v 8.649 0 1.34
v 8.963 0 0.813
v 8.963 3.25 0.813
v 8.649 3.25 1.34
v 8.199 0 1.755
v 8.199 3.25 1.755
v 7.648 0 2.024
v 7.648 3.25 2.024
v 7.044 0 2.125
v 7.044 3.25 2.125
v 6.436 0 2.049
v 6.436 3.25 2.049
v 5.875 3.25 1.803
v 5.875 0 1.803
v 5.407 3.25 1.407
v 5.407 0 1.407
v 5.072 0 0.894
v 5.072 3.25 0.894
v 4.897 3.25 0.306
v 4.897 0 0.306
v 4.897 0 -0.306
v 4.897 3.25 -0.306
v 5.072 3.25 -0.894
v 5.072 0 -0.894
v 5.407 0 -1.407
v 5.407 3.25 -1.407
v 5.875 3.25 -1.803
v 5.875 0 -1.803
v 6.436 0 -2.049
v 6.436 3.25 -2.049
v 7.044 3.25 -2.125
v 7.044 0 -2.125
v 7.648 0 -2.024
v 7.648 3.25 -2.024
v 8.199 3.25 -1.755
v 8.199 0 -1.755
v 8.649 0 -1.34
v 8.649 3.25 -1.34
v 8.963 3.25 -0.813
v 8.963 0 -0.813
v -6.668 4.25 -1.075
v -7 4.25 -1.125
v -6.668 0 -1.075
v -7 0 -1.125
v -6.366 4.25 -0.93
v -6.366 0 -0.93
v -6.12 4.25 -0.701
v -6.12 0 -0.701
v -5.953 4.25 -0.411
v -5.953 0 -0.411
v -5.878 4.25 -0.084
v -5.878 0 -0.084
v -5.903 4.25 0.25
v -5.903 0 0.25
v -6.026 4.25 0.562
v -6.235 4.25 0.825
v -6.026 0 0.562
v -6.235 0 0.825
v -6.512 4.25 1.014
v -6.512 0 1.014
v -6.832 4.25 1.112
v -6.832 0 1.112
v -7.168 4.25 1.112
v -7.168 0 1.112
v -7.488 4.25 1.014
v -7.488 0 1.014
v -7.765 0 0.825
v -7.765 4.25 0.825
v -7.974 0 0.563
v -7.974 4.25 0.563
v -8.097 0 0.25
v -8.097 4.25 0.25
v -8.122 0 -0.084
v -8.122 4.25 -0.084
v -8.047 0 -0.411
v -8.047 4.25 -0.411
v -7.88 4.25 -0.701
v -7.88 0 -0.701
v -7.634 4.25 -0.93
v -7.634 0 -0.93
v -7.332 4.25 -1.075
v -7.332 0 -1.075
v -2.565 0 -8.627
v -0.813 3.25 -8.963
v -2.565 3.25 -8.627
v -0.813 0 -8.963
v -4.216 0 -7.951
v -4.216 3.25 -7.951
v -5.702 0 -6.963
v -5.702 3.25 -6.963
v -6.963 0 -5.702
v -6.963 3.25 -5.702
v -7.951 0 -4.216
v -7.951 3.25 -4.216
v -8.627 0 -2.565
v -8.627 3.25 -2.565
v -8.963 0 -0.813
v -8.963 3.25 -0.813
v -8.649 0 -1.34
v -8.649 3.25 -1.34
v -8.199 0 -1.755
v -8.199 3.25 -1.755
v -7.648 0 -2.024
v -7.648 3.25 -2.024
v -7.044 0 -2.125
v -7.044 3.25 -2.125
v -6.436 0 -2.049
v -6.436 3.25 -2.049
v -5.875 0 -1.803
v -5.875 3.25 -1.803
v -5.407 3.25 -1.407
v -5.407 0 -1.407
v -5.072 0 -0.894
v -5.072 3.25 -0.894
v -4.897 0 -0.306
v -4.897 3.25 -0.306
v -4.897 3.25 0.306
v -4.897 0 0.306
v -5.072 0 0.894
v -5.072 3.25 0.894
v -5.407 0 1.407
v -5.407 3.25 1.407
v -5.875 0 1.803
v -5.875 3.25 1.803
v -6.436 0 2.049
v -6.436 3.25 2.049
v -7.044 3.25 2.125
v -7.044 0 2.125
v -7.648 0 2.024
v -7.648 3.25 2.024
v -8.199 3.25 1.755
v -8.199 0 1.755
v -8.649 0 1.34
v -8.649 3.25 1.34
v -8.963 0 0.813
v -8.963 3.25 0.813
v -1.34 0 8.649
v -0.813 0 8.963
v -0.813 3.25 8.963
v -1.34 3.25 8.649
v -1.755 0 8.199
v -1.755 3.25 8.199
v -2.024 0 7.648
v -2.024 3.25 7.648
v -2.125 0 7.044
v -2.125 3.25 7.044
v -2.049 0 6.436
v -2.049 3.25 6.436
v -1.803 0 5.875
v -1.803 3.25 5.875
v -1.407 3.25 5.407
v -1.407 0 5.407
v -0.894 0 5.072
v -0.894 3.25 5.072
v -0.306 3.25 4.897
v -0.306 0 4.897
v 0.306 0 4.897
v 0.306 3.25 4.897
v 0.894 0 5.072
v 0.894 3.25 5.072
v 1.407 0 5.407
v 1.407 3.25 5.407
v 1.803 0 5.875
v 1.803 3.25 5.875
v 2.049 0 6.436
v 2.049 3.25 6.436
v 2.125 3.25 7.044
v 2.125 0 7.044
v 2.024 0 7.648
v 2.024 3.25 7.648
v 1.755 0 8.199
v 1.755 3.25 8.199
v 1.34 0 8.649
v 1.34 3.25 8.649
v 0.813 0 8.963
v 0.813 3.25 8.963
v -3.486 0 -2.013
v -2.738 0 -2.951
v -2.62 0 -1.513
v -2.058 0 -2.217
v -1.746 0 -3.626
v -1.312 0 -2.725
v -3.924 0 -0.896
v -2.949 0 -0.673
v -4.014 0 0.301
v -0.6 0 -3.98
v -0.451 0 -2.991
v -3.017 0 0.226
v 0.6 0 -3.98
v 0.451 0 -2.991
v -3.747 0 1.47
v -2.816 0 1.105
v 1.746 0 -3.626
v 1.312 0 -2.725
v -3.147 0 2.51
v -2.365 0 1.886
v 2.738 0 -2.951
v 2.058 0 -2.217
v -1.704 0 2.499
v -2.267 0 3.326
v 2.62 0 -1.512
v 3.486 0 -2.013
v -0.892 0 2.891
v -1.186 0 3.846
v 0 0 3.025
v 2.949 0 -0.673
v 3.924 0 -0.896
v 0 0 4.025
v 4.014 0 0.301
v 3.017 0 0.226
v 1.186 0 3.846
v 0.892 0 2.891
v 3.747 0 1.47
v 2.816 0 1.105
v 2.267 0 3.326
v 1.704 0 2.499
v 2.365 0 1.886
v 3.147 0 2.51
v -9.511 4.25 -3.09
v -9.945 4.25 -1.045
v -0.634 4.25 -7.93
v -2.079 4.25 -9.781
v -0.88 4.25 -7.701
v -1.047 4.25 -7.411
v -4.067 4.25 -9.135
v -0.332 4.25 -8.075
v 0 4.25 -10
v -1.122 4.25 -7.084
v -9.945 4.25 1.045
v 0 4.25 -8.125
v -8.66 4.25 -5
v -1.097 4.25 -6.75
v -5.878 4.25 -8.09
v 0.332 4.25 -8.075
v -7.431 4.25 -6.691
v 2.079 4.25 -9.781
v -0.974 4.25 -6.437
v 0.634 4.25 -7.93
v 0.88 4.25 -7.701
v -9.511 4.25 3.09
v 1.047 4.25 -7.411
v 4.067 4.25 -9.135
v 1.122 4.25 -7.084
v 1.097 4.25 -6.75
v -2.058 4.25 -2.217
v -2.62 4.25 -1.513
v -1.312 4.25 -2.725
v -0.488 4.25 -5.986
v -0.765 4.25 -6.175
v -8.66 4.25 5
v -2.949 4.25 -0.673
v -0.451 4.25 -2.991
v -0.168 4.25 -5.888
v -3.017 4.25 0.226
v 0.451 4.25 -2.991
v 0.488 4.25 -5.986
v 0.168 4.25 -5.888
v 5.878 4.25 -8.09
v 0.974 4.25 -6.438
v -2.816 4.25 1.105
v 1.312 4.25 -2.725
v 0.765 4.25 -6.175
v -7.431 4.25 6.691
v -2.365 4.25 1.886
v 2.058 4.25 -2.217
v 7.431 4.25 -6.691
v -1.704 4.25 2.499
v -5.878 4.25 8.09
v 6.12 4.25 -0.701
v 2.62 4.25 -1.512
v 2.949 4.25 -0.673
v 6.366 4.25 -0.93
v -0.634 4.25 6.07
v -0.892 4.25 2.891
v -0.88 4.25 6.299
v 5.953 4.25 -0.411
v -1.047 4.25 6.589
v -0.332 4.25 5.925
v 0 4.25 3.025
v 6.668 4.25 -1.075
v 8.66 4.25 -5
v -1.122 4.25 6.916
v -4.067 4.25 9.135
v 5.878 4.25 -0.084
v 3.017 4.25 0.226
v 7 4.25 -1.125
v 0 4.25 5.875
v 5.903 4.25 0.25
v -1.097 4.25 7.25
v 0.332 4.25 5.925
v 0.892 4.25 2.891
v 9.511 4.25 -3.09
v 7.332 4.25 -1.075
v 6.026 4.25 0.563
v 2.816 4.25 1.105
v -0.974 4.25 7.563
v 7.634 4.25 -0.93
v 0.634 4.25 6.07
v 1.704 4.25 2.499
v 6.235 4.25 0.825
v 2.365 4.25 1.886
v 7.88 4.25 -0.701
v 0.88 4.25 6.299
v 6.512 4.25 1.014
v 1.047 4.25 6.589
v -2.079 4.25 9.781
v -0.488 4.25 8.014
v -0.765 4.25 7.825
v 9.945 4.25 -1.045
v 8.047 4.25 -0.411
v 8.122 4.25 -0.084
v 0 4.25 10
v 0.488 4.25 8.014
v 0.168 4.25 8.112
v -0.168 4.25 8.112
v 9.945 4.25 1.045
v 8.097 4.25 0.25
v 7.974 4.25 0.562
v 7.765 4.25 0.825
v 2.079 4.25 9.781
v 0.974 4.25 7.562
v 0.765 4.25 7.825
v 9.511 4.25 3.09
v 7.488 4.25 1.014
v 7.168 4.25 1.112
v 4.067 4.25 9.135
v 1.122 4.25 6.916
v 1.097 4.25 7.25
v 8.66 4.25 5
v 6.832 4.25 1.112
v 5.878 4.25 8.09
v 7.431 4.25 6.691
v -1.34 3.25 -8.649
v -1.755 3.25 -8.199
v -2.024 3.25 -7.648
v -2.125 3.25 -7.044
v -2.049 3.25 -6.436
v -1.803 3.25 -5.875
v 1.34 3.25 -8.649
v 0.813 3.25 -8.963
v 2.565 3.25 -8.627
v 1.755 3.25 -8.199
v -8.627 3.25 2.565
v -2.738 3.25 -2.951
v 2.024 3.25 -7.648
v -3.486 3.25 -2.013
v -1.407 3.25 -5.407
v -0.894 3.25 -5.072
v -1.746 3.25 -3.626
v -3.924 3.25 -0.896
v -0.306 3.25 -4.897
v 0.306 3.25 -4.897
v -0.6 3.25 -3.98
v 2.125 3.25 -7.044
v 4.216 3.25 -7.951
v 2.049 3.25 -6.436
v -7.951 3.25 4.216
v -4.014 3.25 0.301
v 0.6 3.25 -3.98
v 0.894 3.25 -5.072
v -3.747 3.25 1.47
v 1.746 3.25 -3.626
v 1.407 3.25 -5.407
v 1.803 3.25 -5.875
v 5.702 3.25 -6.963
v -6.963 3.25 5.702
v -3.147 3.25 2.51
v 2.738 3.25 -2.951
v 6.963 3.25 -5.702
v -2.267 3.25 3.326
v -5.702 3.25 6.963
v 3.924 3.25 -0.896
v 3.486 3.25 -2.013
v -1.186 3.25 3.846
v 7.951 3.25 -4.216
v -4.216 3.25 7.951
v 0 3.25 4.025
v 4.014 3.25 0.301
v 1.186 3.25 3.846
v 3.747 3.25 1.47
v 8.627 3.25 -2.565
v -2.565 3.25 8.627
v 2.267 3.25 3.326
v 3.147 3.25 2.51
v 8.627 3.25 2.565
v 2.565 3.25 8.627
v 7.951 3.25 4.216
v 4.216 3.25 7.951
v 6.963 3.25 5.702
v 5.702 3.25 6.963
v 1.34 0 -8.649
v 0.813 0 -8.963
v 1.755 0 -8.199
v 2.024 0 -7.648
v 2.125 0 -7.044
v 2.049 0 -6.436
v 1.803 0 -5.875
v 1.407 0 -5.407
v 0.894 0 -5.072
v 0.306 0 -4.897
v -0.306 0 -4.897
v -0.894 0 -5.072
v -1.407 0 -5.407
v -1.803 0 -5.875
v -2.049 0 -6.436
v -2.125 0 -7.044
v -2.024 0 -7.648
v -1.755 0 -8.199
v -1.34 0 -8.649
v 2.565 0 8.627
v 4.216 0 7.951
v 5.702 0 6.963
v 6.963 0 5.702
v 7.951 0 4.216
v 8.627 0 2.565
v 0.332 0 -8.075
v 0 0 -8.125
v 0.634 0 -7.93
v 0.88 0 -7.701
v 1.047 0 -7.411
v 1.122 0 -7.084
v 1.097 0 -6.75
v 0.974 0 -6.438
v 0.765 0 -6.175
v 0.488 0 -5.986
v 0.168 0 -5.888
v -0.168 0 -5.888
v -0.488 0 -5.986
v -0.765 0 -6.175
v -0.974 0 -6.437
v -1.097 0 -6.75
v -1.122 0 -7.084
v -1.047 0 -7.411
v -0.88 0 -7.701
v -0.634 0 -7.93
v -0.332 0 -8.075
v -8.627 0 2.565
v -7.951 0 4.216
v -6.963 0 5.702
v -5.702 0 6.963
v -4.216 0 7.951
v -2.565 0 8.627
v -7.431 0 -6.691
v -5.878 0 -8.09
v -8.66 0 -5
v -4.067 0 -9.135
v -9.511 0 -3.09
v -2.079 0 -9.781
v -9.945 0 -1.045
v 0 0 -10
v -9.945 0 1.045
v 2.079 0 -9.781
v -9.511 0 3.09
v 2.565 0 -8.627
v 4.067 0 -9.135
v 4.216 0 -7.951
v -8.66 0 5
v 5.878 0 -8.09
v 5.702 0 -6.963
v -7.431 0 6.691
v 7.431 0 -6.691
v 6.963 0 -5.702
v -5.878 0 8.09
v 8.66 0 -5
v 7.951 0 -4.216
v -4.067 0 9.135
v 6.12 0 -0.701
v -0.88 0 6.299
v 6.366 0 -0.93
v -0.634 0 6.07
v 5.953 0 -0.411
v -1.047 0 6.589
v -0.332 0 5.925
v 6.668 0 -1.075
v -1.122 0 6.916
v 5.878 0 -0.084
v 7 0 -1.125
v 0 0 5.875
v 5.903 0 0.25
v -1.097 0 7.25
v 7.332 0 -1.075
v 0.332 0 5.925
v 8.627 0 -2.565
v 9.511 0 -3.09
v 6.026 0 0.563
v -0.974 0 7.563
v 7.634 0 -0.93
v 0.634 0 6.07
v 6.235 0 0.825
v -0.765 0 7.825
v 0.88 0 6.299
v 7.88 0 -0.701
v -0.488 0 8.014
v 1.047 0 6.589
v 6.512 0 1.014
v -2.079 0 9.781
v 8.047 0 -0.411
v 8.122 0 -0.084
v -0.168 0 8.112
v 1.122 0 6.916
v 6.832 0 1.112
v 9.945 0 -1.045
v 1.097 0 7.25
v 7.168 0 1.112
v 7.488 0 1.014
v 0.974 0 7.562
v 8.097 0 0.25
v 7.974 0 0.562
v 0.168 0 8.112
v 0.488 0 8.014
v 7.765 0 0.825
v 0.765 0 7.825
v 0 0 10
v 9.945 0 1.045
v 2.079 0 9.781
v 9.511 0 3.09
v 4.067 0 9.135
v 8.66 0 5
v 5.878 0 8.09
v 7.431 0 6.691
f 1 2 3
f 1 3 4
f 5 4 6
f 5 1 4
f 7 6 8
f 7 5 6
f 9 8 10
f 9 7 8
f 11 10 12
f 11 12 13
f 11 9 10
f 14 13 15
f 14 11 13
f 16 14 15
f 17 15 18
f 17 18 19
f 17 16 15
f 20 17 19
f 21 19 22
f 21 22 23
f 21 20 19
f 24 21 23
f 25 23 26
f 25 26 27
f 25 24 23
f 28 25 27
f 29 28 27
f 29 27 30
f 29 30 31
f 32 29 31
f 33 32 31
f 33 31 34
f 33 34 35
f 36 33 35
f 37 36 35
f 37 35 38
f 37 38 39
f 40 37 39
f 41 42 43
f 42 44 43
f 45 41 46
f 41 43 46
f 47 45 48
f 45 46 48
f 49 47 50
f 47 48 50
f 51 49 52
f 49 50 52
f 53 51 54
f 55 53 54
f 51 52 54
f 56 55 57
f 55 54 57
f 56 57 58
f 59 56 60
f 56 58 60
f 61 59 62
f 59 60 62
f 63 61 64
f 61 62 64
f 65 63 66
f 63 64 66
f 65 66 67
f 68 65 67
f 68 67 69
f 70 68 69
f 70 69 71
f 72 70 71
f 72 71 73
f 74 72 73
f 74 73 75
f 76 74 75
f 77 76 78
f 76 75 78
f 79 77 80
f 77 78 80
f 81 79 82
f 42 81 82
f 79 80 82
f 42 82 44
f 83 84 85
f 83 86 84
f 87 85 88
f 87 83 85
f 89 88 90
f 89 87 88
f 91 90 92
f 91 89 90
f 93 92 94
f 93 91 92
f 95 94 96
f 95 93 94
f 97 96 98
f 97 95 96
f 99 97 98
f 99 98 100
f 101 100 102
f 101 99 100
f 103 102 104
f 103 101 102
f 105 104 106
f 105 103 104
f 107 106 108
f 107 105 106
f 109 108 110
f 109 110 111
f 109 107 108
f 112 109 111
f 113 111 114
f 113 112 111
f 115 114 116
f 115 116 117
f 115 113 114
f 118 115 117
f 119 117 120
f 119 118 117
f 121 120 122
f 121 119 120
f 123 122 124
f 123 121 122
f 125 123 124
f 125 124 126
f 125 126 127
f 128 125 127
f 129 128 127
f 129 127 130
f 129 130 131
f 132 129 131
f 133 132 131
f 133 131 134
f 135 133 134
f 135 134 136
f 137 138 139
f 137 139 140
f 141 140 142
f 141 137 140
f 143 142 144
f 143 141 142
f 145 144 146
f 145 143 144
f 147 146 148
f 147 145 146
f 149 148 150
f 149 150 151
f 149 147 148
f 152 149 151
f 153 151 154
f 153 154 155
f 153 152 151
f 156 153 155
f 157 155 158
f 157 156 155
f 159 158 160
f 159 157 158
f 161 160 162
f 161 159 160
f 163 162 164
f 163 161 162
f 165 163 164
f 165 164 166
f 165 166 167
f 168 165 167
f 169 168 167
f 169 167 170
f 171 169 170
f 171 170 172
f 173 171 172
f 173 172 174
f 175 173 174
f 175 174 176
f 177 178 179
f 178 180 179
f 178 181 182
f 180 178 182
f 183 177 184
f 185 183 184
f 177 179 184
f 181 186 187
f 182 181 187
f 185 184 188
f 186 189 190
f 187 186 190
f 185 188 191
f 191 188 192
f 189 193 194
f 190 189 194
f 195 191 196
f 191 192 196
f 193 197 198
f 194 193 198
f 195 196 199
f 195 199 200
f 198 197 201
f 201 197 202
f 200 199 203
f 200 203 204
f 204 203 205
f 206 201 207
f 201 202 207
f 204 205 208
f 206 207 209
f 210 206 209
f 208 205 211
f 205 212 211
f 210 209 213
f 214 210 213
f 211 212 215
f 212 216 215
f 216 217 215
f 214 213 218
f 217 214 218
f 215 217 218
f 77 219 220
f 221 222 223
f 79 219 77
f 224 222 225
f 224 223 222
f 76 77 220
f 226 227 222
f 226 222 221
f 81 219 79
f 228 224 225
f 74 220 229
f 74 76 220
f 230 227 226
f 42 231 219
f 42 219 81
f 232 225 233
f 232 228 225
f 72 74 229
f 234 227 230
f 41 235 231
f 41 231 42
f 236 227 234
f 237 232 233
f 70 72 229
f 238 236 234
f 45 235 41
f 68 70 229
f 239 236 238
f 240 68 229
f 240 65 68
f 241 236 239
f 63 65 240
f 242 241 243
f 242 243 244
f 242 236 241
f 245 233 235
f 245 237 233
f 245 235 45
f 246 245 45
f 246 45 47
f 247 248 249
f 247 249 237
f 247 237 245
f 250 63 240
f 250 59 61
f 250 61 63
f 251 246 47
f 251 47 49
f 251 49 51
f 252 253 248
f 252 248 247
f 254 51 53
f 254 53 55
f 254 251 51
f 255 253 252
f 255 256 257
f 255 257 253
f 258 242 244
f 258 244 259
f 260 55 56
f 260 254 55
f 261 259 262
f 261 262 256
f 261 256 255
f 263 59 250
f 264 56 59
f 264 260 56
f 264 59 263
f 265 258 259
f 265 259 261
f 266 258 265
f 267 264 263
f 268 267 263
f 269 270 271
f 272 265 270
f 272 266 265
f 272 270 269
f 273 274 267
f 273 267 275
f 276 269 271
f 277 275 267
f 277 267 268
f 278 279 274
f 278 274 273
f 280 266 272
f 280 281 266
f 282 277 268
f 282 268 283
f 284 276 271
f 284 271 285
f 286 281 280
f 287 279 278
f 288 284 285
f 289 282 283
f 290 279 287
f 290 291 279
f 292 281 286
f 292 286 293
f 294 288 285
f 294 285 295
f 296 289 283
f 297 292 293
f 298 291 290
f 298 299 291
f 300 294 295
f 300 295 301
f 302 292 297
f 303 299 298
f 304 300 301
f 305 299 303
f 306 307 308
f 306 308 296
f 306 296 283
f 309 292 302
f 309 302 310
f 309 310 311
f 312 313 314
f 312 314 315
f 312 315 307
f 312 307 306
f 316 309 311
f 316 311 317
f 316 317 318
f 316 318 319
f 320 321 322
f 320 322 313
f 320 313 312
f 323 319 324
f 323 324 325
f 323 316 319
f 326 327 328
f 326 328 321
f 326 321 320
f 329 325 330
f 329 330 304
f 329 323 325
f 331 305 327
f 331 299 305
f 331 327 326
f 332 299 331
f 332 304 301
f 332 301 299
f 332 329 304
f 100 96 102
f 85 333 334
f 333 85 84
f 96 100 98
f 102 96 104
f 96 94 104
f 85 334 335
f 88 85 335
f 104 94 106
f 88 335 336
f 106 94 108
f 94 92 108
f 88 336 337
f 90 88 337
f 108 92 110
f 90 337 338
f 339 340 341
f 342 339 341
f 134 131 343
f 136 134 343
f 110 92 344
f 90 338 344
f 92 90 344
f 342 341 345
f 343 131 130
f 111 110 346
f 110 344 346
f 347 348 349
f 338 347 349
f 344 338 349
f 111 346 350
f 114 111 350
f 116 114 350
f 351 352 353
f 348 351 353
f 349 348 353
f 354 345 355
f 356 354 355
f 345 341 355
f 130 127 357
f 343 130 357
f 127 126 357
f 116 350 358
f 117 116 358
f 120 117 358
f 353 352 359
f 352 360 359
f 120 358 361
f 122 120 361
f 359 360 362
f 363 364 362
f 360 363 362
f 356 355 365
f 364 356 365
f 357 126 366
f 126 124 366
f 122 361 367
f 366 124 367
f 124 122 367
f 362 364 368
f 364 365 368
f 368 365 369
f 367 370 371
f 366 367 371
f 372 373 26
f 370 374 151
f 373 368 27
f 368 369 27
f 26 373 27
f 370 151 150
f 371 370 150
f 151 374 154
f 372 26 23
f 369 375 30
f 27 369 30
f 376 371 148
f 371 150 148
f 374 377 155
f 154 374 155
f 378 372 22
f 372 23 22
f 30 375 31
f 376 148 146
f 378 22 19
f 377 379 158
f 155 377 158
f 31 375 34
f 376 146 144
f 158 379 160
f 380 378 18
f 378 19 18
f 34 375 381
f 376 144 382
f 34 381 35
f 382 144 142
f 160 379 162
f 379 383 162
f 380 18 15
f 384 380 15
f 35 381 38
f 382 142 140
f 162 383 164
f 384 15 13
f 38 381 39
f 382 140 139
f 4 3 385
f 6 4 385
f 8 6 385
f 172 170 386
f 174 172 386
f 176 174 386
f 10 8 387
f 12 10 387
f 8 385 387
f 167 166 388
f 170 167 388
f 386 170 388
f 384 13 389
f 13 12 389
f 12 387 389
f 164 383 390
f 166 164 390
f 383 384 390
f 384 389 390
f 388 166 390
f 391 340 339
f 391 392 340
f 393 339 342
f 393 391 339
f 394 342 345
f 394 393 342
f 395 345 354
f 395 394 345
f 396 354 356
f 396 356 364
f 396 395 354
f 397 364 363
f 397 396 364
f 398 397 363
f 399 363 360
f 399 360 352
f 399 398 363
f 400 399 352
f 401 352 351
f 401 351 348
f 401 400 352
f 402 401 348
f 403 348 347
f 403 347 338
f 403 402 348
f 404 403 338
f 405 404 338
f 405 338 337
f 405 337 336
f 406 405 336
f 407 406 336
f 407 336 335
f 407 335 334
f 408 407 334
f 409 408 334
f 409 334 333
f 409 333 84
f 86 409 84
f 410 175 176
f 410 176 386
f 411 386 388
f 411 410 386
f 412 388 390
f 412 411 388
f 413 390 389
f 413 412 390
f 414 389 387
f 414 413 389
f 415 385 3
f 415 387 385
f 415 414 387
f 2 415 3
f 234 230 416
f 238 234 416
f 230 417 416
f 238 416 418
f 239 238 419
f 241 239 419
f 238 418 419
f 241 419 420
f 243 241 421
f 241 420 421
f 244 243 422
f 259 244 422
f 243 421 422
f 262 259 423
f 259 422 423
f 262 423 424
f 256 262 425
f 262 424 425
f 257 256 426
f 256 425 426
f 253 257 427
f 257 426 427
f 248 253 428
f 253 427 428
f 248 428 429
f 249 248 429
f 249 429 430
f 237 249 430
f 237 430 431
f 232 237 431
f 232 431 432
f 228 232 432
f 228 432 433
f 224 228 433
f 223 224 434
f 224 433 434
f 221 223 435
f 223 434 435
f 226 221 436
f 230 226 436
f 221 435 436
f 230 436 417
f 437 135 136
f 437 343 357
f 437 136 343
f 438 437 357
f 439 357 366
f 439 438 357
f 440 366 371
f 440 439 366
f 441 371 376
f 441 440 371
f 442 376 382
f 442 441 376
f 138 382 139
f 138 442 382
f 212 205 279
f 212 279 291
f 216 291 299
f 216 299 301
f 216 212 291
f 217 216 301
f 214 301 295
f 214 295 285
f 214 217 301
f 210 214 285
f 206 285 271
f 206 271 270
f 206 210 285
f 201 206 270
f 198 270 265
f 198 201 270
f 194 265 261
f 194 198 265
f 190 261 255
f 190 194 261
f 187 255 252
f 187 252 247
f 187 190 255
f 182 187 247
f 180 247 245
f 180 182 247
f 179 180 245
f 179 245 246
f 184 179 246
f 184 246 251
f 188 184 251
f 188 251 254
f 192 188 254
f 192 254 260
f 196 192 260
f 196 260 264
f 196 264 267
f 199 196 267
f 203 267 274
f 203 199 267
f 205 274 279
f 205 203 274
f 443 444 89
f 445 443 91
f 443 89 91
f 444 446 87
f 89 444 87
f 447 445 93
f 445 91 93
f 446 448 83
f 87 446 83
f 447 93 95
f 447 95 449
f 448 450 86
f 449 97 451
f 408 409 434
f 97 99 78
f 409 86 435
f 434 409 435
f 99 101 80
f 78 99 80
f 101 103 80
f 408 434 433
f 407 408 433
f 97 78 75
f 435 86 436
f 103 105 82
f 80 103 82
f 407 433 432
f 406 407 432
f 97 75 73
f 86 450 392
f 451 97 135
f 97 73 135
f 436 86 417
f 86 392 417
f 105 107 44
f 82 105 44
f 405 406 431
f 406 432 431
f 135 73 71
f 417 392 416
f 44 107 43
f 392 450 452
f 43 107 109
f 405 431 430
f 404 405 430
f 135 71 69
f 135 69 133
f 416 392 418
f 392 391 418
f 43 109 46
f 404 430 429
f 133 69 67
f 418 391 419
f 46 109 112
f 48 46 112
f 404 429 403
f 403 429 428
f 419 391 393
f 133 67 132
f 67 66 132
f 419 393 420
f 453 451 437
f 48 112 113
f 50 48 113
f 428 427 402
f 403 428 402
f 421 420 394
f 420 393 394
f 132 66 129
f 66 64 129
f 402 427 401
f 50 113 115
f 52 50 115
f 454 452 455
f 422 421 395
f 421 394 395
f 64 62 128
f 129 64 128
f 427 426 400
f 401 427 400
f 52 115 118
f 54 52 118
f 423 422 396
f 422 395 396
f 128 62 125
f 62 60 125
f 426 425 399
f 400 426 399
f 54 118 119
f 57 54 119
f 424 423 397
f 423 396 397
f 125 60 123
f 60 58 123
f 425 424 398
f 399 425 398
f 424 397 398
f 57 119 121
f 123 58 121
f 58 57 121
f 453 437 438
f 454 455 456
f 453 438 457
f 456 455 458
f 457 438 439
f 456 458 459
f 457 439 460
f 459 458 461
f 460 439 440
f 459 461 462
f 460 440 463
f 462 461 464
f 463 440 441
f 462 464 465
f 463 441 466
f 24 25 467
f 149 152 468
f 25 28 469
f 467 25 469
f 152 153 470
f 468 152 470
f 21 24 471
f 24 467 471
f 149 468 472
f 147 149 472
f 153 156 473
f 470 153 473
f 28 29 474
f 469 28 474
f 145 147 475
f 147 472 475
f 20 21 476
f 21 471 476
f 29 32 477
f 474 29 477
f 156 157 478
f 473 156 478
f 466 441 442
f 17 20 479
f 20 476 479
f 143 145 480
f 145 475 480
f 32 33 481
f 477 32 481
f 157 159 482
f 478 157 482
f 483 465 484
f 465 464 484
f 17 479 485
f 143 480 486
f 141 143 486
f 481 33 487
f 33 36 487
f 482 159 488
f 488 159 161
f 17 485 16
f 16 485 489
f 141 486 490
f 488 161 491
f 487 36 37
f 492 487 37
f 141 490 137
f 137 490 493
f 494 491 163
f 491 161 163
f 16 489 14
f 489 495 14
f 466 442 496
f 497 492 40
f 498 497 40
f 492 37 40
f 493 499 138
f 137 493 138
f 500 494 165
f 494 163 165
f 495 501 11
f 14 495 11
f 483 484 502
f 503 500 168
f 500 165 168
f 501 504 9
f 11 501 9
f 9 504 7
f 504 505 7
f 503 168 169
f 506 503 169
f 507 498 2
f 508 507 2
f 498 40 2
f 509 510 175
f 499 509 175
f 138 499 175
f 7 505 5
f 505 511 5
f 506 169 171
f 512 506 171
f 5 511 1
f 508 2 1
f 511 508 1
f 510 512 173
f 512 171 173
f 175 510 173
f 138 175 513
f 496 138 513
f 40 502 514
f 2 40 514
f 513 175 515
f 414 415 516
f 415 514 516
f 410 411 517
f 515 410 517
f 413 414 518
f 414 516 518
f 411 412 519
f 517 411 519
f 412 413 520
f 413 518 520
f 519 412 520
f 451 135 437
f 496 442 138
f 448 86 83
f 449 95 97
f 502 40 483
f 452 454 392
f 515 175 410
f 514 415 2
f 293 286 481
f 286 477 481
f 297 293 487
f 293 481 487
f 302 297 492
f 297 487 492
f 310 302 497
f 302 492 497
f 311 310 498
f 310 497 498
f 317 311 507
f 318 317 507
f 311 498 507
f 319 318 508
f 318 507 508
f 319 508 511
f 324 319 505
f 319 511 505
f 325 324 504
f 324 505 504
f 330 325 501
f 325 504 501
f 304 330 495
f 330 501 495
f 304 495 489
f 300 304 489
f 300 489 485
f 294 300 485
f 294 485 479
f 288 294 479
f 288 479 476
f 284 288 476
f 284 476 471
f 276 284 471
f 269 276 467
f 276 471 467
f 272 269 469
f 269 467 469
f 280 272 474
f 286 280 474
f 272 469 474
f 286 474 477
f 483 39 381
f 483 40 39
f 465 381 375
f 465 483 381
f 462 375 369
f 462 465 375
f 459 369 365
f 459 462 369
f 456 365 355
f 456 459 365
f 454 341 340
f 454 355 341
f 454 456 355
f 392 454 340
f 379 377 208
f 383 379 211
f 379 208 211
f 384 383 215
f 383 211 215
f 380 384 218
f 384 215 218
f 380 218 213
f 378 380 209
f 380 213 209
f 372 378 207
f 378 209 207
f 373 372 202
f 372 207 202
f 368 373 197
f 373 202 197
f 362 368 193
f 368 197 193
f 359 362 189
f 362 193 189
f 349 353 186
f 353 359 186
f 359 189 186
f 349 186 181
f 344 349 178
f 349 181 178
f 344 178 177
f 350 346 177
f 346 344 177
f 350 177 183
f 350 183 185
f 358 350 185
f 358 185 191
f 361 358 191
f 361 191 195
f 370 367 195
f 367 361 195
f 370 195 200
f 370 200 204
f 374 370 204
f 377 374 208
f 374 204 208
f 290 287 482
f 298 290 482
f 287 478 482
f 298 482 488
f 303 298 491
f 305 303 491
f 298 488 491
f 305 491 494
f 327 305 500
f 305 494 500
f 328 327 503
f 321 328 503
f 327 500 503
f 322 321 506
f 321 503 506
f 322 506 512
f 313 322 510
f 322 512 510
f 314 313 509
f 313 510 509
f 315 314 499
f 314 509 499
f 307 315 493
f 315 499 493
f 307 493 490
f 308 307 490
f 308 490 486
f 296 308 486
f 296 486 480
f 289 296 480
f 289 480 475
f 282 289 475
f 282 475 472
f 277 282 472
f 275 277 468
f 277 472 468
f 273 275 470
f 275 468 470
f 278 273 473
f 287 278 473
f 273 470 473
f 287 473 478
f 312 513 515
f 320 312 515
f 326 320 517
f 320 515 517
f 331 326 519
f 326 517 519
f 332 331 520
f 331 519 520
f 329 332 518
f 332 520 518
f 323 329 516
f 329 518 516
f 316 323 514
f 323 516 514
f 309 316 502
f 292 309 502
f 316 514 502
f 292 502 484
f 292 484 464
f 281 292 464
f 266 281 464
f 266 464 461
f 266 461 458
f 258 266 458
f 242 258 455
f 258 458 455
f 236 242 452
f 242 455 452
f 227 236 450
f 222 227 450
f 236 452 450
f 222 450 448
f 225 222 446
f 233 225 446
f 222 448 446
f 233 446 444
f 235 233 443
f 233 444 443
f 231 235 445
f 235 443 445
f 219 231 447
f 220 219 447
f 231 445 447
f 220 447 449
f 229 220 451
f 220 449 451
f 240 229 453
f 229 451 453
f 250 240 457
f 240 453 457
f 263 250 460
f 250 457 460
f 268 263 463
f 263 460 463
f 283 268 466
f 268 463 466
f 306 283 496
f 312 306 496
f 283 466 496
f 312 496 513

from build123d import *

# Parameters (mm, degrees)
SKETCH1_R           = 10
SKETCH1_R_2         = 3.025
BOSS_EXTRUDE1_DEPTH = 4.25
CUT_EXTRUDE1_DEPTH  = 2
SKETCH4_R           = 1.125
CUT_EXTRUDE2_DEPTH  = 15.320003492
SKETCH5_R           = 10
SKETCH5_R_2         = 1.125
SKETCH5_R_3         = 3.025
BOSS_EXTRUDE2_DEPTH = 4.25
SHELL1_T            = -1


with BuildPart() as part:
    # Sketch1 → Boss-Extrude1 (new body)
    with BuildSketch(Plane(origin=(0, 0, 0), x_dir=(1, 0, 0), z_dir=(0, 1, 0))):
        with Locations(Location((0, 0, 0), (0, 0, 270))):
            Circle(SKETCH1_R)
        with Locations(Location((0, 0, 0), (0, 0, 270))):
            Circle(SKETCH1_R_2, mode=Mode.SUBTRACT)
    extrude(amount=BOSS_EXTRUDE1_DEPTH)

    # Sketch3 → Cut-Extrude1 (cut)
    with BuildSketch(Plane.XZ):
        Polygon((7, 2.309401077), (5, 1.154700538), (5, -1.154700538), (7, -2.309401077), (9, -1.154700538), (9, 1.154700538), align=None)
        Polygon((-2.309401077, 7), (-1.154700538, 5), (1.154700538, 5), (2.309401077, 7), (1.154700538, 9), (-1.154700538, 9), align=None)
        Polygon((2.309401077, -7), (1.154700538, -5), (-1.154700538, -5), (-2.309401077, -7), (-1.154700538, -9), (1.154700538, -9), align=None)
        Polygon((-7, -2.309401077), (-5, -1.154700538), (-5, 1.154700538), (-7, 2.309401077), (-9, 1.154700538), (-9, -1.154700538), align=None)
    extrude(amount=-CUT_EXTRUDE1_DEPTH, mode=Mode.SUBTRACT)

    # Sketch4 → Cut-Extrude2 (cut, through all)
    with BuildSketch(Plane.XZ.offset(-2)):
        with Locations(Location((0, -7, 0), (0, 0, 270))):
            Circle(SKETCH4_R)
        with Locations(Location((0, 7, 0), (0, 0, 270))):
            Circle(SKETCH4_R)
        with Locations(Location((7, 0, 0), (0, 0, 270))):
            Circle(SKETCH4_R)
        with Locations(Location((-7, 0, 0), (0, 0, 270))):
            Circle(SKETCH4_R)
    extrude(amount=-CUT_EXTRUDE2_DEPTH, mode=Mode.SUBTRACT)

    # Sketch5 → Boss-Extrude2 (add)
    with BuildSketch(Plane.XZ):
        with Locations(Location((0, 0, 0), (0, 0, 90))):
            Circle(SKETCH5_R)
        with Locations(Location((7, 0, 0), (0, 0, 270))):
            Circle(SKETCH5_R_2, mode=Mode.SUBTRACT)
        with Locations(Location((0, -7, 0), (0, 0, 270))):
            Circle(SKETCH5_R_2, mode=Mode.SUBTRACT)
        with Locations(Location((-7, 0, 0), (0, 0, 270))):
            Circle(SKETCH5_R_2, mode=Mode.SUBTRACT)
        with Locations(Location((0, 7, 0), (0, 0, 270))):
            Circle(SKETCH5_R_2, mode=Mode.SUBTRACT)
        with Locations(Location((0, 0, 0), (0, 0, 90))):
            Circle(SKETCH5_R_3, mode=Mode.SUBTRACT)
    extrude(amount=-BOSS_EXTRUDE2_DEPTH)

    # Shell1
    shell1_openings = [part.faces().sort_by_distance(p)[0] for p in [
        (0, 0, -9.717157288),
    ]]
    offset(amount=SHELL1_T, openings=shell1_openings)


solid = part.part
